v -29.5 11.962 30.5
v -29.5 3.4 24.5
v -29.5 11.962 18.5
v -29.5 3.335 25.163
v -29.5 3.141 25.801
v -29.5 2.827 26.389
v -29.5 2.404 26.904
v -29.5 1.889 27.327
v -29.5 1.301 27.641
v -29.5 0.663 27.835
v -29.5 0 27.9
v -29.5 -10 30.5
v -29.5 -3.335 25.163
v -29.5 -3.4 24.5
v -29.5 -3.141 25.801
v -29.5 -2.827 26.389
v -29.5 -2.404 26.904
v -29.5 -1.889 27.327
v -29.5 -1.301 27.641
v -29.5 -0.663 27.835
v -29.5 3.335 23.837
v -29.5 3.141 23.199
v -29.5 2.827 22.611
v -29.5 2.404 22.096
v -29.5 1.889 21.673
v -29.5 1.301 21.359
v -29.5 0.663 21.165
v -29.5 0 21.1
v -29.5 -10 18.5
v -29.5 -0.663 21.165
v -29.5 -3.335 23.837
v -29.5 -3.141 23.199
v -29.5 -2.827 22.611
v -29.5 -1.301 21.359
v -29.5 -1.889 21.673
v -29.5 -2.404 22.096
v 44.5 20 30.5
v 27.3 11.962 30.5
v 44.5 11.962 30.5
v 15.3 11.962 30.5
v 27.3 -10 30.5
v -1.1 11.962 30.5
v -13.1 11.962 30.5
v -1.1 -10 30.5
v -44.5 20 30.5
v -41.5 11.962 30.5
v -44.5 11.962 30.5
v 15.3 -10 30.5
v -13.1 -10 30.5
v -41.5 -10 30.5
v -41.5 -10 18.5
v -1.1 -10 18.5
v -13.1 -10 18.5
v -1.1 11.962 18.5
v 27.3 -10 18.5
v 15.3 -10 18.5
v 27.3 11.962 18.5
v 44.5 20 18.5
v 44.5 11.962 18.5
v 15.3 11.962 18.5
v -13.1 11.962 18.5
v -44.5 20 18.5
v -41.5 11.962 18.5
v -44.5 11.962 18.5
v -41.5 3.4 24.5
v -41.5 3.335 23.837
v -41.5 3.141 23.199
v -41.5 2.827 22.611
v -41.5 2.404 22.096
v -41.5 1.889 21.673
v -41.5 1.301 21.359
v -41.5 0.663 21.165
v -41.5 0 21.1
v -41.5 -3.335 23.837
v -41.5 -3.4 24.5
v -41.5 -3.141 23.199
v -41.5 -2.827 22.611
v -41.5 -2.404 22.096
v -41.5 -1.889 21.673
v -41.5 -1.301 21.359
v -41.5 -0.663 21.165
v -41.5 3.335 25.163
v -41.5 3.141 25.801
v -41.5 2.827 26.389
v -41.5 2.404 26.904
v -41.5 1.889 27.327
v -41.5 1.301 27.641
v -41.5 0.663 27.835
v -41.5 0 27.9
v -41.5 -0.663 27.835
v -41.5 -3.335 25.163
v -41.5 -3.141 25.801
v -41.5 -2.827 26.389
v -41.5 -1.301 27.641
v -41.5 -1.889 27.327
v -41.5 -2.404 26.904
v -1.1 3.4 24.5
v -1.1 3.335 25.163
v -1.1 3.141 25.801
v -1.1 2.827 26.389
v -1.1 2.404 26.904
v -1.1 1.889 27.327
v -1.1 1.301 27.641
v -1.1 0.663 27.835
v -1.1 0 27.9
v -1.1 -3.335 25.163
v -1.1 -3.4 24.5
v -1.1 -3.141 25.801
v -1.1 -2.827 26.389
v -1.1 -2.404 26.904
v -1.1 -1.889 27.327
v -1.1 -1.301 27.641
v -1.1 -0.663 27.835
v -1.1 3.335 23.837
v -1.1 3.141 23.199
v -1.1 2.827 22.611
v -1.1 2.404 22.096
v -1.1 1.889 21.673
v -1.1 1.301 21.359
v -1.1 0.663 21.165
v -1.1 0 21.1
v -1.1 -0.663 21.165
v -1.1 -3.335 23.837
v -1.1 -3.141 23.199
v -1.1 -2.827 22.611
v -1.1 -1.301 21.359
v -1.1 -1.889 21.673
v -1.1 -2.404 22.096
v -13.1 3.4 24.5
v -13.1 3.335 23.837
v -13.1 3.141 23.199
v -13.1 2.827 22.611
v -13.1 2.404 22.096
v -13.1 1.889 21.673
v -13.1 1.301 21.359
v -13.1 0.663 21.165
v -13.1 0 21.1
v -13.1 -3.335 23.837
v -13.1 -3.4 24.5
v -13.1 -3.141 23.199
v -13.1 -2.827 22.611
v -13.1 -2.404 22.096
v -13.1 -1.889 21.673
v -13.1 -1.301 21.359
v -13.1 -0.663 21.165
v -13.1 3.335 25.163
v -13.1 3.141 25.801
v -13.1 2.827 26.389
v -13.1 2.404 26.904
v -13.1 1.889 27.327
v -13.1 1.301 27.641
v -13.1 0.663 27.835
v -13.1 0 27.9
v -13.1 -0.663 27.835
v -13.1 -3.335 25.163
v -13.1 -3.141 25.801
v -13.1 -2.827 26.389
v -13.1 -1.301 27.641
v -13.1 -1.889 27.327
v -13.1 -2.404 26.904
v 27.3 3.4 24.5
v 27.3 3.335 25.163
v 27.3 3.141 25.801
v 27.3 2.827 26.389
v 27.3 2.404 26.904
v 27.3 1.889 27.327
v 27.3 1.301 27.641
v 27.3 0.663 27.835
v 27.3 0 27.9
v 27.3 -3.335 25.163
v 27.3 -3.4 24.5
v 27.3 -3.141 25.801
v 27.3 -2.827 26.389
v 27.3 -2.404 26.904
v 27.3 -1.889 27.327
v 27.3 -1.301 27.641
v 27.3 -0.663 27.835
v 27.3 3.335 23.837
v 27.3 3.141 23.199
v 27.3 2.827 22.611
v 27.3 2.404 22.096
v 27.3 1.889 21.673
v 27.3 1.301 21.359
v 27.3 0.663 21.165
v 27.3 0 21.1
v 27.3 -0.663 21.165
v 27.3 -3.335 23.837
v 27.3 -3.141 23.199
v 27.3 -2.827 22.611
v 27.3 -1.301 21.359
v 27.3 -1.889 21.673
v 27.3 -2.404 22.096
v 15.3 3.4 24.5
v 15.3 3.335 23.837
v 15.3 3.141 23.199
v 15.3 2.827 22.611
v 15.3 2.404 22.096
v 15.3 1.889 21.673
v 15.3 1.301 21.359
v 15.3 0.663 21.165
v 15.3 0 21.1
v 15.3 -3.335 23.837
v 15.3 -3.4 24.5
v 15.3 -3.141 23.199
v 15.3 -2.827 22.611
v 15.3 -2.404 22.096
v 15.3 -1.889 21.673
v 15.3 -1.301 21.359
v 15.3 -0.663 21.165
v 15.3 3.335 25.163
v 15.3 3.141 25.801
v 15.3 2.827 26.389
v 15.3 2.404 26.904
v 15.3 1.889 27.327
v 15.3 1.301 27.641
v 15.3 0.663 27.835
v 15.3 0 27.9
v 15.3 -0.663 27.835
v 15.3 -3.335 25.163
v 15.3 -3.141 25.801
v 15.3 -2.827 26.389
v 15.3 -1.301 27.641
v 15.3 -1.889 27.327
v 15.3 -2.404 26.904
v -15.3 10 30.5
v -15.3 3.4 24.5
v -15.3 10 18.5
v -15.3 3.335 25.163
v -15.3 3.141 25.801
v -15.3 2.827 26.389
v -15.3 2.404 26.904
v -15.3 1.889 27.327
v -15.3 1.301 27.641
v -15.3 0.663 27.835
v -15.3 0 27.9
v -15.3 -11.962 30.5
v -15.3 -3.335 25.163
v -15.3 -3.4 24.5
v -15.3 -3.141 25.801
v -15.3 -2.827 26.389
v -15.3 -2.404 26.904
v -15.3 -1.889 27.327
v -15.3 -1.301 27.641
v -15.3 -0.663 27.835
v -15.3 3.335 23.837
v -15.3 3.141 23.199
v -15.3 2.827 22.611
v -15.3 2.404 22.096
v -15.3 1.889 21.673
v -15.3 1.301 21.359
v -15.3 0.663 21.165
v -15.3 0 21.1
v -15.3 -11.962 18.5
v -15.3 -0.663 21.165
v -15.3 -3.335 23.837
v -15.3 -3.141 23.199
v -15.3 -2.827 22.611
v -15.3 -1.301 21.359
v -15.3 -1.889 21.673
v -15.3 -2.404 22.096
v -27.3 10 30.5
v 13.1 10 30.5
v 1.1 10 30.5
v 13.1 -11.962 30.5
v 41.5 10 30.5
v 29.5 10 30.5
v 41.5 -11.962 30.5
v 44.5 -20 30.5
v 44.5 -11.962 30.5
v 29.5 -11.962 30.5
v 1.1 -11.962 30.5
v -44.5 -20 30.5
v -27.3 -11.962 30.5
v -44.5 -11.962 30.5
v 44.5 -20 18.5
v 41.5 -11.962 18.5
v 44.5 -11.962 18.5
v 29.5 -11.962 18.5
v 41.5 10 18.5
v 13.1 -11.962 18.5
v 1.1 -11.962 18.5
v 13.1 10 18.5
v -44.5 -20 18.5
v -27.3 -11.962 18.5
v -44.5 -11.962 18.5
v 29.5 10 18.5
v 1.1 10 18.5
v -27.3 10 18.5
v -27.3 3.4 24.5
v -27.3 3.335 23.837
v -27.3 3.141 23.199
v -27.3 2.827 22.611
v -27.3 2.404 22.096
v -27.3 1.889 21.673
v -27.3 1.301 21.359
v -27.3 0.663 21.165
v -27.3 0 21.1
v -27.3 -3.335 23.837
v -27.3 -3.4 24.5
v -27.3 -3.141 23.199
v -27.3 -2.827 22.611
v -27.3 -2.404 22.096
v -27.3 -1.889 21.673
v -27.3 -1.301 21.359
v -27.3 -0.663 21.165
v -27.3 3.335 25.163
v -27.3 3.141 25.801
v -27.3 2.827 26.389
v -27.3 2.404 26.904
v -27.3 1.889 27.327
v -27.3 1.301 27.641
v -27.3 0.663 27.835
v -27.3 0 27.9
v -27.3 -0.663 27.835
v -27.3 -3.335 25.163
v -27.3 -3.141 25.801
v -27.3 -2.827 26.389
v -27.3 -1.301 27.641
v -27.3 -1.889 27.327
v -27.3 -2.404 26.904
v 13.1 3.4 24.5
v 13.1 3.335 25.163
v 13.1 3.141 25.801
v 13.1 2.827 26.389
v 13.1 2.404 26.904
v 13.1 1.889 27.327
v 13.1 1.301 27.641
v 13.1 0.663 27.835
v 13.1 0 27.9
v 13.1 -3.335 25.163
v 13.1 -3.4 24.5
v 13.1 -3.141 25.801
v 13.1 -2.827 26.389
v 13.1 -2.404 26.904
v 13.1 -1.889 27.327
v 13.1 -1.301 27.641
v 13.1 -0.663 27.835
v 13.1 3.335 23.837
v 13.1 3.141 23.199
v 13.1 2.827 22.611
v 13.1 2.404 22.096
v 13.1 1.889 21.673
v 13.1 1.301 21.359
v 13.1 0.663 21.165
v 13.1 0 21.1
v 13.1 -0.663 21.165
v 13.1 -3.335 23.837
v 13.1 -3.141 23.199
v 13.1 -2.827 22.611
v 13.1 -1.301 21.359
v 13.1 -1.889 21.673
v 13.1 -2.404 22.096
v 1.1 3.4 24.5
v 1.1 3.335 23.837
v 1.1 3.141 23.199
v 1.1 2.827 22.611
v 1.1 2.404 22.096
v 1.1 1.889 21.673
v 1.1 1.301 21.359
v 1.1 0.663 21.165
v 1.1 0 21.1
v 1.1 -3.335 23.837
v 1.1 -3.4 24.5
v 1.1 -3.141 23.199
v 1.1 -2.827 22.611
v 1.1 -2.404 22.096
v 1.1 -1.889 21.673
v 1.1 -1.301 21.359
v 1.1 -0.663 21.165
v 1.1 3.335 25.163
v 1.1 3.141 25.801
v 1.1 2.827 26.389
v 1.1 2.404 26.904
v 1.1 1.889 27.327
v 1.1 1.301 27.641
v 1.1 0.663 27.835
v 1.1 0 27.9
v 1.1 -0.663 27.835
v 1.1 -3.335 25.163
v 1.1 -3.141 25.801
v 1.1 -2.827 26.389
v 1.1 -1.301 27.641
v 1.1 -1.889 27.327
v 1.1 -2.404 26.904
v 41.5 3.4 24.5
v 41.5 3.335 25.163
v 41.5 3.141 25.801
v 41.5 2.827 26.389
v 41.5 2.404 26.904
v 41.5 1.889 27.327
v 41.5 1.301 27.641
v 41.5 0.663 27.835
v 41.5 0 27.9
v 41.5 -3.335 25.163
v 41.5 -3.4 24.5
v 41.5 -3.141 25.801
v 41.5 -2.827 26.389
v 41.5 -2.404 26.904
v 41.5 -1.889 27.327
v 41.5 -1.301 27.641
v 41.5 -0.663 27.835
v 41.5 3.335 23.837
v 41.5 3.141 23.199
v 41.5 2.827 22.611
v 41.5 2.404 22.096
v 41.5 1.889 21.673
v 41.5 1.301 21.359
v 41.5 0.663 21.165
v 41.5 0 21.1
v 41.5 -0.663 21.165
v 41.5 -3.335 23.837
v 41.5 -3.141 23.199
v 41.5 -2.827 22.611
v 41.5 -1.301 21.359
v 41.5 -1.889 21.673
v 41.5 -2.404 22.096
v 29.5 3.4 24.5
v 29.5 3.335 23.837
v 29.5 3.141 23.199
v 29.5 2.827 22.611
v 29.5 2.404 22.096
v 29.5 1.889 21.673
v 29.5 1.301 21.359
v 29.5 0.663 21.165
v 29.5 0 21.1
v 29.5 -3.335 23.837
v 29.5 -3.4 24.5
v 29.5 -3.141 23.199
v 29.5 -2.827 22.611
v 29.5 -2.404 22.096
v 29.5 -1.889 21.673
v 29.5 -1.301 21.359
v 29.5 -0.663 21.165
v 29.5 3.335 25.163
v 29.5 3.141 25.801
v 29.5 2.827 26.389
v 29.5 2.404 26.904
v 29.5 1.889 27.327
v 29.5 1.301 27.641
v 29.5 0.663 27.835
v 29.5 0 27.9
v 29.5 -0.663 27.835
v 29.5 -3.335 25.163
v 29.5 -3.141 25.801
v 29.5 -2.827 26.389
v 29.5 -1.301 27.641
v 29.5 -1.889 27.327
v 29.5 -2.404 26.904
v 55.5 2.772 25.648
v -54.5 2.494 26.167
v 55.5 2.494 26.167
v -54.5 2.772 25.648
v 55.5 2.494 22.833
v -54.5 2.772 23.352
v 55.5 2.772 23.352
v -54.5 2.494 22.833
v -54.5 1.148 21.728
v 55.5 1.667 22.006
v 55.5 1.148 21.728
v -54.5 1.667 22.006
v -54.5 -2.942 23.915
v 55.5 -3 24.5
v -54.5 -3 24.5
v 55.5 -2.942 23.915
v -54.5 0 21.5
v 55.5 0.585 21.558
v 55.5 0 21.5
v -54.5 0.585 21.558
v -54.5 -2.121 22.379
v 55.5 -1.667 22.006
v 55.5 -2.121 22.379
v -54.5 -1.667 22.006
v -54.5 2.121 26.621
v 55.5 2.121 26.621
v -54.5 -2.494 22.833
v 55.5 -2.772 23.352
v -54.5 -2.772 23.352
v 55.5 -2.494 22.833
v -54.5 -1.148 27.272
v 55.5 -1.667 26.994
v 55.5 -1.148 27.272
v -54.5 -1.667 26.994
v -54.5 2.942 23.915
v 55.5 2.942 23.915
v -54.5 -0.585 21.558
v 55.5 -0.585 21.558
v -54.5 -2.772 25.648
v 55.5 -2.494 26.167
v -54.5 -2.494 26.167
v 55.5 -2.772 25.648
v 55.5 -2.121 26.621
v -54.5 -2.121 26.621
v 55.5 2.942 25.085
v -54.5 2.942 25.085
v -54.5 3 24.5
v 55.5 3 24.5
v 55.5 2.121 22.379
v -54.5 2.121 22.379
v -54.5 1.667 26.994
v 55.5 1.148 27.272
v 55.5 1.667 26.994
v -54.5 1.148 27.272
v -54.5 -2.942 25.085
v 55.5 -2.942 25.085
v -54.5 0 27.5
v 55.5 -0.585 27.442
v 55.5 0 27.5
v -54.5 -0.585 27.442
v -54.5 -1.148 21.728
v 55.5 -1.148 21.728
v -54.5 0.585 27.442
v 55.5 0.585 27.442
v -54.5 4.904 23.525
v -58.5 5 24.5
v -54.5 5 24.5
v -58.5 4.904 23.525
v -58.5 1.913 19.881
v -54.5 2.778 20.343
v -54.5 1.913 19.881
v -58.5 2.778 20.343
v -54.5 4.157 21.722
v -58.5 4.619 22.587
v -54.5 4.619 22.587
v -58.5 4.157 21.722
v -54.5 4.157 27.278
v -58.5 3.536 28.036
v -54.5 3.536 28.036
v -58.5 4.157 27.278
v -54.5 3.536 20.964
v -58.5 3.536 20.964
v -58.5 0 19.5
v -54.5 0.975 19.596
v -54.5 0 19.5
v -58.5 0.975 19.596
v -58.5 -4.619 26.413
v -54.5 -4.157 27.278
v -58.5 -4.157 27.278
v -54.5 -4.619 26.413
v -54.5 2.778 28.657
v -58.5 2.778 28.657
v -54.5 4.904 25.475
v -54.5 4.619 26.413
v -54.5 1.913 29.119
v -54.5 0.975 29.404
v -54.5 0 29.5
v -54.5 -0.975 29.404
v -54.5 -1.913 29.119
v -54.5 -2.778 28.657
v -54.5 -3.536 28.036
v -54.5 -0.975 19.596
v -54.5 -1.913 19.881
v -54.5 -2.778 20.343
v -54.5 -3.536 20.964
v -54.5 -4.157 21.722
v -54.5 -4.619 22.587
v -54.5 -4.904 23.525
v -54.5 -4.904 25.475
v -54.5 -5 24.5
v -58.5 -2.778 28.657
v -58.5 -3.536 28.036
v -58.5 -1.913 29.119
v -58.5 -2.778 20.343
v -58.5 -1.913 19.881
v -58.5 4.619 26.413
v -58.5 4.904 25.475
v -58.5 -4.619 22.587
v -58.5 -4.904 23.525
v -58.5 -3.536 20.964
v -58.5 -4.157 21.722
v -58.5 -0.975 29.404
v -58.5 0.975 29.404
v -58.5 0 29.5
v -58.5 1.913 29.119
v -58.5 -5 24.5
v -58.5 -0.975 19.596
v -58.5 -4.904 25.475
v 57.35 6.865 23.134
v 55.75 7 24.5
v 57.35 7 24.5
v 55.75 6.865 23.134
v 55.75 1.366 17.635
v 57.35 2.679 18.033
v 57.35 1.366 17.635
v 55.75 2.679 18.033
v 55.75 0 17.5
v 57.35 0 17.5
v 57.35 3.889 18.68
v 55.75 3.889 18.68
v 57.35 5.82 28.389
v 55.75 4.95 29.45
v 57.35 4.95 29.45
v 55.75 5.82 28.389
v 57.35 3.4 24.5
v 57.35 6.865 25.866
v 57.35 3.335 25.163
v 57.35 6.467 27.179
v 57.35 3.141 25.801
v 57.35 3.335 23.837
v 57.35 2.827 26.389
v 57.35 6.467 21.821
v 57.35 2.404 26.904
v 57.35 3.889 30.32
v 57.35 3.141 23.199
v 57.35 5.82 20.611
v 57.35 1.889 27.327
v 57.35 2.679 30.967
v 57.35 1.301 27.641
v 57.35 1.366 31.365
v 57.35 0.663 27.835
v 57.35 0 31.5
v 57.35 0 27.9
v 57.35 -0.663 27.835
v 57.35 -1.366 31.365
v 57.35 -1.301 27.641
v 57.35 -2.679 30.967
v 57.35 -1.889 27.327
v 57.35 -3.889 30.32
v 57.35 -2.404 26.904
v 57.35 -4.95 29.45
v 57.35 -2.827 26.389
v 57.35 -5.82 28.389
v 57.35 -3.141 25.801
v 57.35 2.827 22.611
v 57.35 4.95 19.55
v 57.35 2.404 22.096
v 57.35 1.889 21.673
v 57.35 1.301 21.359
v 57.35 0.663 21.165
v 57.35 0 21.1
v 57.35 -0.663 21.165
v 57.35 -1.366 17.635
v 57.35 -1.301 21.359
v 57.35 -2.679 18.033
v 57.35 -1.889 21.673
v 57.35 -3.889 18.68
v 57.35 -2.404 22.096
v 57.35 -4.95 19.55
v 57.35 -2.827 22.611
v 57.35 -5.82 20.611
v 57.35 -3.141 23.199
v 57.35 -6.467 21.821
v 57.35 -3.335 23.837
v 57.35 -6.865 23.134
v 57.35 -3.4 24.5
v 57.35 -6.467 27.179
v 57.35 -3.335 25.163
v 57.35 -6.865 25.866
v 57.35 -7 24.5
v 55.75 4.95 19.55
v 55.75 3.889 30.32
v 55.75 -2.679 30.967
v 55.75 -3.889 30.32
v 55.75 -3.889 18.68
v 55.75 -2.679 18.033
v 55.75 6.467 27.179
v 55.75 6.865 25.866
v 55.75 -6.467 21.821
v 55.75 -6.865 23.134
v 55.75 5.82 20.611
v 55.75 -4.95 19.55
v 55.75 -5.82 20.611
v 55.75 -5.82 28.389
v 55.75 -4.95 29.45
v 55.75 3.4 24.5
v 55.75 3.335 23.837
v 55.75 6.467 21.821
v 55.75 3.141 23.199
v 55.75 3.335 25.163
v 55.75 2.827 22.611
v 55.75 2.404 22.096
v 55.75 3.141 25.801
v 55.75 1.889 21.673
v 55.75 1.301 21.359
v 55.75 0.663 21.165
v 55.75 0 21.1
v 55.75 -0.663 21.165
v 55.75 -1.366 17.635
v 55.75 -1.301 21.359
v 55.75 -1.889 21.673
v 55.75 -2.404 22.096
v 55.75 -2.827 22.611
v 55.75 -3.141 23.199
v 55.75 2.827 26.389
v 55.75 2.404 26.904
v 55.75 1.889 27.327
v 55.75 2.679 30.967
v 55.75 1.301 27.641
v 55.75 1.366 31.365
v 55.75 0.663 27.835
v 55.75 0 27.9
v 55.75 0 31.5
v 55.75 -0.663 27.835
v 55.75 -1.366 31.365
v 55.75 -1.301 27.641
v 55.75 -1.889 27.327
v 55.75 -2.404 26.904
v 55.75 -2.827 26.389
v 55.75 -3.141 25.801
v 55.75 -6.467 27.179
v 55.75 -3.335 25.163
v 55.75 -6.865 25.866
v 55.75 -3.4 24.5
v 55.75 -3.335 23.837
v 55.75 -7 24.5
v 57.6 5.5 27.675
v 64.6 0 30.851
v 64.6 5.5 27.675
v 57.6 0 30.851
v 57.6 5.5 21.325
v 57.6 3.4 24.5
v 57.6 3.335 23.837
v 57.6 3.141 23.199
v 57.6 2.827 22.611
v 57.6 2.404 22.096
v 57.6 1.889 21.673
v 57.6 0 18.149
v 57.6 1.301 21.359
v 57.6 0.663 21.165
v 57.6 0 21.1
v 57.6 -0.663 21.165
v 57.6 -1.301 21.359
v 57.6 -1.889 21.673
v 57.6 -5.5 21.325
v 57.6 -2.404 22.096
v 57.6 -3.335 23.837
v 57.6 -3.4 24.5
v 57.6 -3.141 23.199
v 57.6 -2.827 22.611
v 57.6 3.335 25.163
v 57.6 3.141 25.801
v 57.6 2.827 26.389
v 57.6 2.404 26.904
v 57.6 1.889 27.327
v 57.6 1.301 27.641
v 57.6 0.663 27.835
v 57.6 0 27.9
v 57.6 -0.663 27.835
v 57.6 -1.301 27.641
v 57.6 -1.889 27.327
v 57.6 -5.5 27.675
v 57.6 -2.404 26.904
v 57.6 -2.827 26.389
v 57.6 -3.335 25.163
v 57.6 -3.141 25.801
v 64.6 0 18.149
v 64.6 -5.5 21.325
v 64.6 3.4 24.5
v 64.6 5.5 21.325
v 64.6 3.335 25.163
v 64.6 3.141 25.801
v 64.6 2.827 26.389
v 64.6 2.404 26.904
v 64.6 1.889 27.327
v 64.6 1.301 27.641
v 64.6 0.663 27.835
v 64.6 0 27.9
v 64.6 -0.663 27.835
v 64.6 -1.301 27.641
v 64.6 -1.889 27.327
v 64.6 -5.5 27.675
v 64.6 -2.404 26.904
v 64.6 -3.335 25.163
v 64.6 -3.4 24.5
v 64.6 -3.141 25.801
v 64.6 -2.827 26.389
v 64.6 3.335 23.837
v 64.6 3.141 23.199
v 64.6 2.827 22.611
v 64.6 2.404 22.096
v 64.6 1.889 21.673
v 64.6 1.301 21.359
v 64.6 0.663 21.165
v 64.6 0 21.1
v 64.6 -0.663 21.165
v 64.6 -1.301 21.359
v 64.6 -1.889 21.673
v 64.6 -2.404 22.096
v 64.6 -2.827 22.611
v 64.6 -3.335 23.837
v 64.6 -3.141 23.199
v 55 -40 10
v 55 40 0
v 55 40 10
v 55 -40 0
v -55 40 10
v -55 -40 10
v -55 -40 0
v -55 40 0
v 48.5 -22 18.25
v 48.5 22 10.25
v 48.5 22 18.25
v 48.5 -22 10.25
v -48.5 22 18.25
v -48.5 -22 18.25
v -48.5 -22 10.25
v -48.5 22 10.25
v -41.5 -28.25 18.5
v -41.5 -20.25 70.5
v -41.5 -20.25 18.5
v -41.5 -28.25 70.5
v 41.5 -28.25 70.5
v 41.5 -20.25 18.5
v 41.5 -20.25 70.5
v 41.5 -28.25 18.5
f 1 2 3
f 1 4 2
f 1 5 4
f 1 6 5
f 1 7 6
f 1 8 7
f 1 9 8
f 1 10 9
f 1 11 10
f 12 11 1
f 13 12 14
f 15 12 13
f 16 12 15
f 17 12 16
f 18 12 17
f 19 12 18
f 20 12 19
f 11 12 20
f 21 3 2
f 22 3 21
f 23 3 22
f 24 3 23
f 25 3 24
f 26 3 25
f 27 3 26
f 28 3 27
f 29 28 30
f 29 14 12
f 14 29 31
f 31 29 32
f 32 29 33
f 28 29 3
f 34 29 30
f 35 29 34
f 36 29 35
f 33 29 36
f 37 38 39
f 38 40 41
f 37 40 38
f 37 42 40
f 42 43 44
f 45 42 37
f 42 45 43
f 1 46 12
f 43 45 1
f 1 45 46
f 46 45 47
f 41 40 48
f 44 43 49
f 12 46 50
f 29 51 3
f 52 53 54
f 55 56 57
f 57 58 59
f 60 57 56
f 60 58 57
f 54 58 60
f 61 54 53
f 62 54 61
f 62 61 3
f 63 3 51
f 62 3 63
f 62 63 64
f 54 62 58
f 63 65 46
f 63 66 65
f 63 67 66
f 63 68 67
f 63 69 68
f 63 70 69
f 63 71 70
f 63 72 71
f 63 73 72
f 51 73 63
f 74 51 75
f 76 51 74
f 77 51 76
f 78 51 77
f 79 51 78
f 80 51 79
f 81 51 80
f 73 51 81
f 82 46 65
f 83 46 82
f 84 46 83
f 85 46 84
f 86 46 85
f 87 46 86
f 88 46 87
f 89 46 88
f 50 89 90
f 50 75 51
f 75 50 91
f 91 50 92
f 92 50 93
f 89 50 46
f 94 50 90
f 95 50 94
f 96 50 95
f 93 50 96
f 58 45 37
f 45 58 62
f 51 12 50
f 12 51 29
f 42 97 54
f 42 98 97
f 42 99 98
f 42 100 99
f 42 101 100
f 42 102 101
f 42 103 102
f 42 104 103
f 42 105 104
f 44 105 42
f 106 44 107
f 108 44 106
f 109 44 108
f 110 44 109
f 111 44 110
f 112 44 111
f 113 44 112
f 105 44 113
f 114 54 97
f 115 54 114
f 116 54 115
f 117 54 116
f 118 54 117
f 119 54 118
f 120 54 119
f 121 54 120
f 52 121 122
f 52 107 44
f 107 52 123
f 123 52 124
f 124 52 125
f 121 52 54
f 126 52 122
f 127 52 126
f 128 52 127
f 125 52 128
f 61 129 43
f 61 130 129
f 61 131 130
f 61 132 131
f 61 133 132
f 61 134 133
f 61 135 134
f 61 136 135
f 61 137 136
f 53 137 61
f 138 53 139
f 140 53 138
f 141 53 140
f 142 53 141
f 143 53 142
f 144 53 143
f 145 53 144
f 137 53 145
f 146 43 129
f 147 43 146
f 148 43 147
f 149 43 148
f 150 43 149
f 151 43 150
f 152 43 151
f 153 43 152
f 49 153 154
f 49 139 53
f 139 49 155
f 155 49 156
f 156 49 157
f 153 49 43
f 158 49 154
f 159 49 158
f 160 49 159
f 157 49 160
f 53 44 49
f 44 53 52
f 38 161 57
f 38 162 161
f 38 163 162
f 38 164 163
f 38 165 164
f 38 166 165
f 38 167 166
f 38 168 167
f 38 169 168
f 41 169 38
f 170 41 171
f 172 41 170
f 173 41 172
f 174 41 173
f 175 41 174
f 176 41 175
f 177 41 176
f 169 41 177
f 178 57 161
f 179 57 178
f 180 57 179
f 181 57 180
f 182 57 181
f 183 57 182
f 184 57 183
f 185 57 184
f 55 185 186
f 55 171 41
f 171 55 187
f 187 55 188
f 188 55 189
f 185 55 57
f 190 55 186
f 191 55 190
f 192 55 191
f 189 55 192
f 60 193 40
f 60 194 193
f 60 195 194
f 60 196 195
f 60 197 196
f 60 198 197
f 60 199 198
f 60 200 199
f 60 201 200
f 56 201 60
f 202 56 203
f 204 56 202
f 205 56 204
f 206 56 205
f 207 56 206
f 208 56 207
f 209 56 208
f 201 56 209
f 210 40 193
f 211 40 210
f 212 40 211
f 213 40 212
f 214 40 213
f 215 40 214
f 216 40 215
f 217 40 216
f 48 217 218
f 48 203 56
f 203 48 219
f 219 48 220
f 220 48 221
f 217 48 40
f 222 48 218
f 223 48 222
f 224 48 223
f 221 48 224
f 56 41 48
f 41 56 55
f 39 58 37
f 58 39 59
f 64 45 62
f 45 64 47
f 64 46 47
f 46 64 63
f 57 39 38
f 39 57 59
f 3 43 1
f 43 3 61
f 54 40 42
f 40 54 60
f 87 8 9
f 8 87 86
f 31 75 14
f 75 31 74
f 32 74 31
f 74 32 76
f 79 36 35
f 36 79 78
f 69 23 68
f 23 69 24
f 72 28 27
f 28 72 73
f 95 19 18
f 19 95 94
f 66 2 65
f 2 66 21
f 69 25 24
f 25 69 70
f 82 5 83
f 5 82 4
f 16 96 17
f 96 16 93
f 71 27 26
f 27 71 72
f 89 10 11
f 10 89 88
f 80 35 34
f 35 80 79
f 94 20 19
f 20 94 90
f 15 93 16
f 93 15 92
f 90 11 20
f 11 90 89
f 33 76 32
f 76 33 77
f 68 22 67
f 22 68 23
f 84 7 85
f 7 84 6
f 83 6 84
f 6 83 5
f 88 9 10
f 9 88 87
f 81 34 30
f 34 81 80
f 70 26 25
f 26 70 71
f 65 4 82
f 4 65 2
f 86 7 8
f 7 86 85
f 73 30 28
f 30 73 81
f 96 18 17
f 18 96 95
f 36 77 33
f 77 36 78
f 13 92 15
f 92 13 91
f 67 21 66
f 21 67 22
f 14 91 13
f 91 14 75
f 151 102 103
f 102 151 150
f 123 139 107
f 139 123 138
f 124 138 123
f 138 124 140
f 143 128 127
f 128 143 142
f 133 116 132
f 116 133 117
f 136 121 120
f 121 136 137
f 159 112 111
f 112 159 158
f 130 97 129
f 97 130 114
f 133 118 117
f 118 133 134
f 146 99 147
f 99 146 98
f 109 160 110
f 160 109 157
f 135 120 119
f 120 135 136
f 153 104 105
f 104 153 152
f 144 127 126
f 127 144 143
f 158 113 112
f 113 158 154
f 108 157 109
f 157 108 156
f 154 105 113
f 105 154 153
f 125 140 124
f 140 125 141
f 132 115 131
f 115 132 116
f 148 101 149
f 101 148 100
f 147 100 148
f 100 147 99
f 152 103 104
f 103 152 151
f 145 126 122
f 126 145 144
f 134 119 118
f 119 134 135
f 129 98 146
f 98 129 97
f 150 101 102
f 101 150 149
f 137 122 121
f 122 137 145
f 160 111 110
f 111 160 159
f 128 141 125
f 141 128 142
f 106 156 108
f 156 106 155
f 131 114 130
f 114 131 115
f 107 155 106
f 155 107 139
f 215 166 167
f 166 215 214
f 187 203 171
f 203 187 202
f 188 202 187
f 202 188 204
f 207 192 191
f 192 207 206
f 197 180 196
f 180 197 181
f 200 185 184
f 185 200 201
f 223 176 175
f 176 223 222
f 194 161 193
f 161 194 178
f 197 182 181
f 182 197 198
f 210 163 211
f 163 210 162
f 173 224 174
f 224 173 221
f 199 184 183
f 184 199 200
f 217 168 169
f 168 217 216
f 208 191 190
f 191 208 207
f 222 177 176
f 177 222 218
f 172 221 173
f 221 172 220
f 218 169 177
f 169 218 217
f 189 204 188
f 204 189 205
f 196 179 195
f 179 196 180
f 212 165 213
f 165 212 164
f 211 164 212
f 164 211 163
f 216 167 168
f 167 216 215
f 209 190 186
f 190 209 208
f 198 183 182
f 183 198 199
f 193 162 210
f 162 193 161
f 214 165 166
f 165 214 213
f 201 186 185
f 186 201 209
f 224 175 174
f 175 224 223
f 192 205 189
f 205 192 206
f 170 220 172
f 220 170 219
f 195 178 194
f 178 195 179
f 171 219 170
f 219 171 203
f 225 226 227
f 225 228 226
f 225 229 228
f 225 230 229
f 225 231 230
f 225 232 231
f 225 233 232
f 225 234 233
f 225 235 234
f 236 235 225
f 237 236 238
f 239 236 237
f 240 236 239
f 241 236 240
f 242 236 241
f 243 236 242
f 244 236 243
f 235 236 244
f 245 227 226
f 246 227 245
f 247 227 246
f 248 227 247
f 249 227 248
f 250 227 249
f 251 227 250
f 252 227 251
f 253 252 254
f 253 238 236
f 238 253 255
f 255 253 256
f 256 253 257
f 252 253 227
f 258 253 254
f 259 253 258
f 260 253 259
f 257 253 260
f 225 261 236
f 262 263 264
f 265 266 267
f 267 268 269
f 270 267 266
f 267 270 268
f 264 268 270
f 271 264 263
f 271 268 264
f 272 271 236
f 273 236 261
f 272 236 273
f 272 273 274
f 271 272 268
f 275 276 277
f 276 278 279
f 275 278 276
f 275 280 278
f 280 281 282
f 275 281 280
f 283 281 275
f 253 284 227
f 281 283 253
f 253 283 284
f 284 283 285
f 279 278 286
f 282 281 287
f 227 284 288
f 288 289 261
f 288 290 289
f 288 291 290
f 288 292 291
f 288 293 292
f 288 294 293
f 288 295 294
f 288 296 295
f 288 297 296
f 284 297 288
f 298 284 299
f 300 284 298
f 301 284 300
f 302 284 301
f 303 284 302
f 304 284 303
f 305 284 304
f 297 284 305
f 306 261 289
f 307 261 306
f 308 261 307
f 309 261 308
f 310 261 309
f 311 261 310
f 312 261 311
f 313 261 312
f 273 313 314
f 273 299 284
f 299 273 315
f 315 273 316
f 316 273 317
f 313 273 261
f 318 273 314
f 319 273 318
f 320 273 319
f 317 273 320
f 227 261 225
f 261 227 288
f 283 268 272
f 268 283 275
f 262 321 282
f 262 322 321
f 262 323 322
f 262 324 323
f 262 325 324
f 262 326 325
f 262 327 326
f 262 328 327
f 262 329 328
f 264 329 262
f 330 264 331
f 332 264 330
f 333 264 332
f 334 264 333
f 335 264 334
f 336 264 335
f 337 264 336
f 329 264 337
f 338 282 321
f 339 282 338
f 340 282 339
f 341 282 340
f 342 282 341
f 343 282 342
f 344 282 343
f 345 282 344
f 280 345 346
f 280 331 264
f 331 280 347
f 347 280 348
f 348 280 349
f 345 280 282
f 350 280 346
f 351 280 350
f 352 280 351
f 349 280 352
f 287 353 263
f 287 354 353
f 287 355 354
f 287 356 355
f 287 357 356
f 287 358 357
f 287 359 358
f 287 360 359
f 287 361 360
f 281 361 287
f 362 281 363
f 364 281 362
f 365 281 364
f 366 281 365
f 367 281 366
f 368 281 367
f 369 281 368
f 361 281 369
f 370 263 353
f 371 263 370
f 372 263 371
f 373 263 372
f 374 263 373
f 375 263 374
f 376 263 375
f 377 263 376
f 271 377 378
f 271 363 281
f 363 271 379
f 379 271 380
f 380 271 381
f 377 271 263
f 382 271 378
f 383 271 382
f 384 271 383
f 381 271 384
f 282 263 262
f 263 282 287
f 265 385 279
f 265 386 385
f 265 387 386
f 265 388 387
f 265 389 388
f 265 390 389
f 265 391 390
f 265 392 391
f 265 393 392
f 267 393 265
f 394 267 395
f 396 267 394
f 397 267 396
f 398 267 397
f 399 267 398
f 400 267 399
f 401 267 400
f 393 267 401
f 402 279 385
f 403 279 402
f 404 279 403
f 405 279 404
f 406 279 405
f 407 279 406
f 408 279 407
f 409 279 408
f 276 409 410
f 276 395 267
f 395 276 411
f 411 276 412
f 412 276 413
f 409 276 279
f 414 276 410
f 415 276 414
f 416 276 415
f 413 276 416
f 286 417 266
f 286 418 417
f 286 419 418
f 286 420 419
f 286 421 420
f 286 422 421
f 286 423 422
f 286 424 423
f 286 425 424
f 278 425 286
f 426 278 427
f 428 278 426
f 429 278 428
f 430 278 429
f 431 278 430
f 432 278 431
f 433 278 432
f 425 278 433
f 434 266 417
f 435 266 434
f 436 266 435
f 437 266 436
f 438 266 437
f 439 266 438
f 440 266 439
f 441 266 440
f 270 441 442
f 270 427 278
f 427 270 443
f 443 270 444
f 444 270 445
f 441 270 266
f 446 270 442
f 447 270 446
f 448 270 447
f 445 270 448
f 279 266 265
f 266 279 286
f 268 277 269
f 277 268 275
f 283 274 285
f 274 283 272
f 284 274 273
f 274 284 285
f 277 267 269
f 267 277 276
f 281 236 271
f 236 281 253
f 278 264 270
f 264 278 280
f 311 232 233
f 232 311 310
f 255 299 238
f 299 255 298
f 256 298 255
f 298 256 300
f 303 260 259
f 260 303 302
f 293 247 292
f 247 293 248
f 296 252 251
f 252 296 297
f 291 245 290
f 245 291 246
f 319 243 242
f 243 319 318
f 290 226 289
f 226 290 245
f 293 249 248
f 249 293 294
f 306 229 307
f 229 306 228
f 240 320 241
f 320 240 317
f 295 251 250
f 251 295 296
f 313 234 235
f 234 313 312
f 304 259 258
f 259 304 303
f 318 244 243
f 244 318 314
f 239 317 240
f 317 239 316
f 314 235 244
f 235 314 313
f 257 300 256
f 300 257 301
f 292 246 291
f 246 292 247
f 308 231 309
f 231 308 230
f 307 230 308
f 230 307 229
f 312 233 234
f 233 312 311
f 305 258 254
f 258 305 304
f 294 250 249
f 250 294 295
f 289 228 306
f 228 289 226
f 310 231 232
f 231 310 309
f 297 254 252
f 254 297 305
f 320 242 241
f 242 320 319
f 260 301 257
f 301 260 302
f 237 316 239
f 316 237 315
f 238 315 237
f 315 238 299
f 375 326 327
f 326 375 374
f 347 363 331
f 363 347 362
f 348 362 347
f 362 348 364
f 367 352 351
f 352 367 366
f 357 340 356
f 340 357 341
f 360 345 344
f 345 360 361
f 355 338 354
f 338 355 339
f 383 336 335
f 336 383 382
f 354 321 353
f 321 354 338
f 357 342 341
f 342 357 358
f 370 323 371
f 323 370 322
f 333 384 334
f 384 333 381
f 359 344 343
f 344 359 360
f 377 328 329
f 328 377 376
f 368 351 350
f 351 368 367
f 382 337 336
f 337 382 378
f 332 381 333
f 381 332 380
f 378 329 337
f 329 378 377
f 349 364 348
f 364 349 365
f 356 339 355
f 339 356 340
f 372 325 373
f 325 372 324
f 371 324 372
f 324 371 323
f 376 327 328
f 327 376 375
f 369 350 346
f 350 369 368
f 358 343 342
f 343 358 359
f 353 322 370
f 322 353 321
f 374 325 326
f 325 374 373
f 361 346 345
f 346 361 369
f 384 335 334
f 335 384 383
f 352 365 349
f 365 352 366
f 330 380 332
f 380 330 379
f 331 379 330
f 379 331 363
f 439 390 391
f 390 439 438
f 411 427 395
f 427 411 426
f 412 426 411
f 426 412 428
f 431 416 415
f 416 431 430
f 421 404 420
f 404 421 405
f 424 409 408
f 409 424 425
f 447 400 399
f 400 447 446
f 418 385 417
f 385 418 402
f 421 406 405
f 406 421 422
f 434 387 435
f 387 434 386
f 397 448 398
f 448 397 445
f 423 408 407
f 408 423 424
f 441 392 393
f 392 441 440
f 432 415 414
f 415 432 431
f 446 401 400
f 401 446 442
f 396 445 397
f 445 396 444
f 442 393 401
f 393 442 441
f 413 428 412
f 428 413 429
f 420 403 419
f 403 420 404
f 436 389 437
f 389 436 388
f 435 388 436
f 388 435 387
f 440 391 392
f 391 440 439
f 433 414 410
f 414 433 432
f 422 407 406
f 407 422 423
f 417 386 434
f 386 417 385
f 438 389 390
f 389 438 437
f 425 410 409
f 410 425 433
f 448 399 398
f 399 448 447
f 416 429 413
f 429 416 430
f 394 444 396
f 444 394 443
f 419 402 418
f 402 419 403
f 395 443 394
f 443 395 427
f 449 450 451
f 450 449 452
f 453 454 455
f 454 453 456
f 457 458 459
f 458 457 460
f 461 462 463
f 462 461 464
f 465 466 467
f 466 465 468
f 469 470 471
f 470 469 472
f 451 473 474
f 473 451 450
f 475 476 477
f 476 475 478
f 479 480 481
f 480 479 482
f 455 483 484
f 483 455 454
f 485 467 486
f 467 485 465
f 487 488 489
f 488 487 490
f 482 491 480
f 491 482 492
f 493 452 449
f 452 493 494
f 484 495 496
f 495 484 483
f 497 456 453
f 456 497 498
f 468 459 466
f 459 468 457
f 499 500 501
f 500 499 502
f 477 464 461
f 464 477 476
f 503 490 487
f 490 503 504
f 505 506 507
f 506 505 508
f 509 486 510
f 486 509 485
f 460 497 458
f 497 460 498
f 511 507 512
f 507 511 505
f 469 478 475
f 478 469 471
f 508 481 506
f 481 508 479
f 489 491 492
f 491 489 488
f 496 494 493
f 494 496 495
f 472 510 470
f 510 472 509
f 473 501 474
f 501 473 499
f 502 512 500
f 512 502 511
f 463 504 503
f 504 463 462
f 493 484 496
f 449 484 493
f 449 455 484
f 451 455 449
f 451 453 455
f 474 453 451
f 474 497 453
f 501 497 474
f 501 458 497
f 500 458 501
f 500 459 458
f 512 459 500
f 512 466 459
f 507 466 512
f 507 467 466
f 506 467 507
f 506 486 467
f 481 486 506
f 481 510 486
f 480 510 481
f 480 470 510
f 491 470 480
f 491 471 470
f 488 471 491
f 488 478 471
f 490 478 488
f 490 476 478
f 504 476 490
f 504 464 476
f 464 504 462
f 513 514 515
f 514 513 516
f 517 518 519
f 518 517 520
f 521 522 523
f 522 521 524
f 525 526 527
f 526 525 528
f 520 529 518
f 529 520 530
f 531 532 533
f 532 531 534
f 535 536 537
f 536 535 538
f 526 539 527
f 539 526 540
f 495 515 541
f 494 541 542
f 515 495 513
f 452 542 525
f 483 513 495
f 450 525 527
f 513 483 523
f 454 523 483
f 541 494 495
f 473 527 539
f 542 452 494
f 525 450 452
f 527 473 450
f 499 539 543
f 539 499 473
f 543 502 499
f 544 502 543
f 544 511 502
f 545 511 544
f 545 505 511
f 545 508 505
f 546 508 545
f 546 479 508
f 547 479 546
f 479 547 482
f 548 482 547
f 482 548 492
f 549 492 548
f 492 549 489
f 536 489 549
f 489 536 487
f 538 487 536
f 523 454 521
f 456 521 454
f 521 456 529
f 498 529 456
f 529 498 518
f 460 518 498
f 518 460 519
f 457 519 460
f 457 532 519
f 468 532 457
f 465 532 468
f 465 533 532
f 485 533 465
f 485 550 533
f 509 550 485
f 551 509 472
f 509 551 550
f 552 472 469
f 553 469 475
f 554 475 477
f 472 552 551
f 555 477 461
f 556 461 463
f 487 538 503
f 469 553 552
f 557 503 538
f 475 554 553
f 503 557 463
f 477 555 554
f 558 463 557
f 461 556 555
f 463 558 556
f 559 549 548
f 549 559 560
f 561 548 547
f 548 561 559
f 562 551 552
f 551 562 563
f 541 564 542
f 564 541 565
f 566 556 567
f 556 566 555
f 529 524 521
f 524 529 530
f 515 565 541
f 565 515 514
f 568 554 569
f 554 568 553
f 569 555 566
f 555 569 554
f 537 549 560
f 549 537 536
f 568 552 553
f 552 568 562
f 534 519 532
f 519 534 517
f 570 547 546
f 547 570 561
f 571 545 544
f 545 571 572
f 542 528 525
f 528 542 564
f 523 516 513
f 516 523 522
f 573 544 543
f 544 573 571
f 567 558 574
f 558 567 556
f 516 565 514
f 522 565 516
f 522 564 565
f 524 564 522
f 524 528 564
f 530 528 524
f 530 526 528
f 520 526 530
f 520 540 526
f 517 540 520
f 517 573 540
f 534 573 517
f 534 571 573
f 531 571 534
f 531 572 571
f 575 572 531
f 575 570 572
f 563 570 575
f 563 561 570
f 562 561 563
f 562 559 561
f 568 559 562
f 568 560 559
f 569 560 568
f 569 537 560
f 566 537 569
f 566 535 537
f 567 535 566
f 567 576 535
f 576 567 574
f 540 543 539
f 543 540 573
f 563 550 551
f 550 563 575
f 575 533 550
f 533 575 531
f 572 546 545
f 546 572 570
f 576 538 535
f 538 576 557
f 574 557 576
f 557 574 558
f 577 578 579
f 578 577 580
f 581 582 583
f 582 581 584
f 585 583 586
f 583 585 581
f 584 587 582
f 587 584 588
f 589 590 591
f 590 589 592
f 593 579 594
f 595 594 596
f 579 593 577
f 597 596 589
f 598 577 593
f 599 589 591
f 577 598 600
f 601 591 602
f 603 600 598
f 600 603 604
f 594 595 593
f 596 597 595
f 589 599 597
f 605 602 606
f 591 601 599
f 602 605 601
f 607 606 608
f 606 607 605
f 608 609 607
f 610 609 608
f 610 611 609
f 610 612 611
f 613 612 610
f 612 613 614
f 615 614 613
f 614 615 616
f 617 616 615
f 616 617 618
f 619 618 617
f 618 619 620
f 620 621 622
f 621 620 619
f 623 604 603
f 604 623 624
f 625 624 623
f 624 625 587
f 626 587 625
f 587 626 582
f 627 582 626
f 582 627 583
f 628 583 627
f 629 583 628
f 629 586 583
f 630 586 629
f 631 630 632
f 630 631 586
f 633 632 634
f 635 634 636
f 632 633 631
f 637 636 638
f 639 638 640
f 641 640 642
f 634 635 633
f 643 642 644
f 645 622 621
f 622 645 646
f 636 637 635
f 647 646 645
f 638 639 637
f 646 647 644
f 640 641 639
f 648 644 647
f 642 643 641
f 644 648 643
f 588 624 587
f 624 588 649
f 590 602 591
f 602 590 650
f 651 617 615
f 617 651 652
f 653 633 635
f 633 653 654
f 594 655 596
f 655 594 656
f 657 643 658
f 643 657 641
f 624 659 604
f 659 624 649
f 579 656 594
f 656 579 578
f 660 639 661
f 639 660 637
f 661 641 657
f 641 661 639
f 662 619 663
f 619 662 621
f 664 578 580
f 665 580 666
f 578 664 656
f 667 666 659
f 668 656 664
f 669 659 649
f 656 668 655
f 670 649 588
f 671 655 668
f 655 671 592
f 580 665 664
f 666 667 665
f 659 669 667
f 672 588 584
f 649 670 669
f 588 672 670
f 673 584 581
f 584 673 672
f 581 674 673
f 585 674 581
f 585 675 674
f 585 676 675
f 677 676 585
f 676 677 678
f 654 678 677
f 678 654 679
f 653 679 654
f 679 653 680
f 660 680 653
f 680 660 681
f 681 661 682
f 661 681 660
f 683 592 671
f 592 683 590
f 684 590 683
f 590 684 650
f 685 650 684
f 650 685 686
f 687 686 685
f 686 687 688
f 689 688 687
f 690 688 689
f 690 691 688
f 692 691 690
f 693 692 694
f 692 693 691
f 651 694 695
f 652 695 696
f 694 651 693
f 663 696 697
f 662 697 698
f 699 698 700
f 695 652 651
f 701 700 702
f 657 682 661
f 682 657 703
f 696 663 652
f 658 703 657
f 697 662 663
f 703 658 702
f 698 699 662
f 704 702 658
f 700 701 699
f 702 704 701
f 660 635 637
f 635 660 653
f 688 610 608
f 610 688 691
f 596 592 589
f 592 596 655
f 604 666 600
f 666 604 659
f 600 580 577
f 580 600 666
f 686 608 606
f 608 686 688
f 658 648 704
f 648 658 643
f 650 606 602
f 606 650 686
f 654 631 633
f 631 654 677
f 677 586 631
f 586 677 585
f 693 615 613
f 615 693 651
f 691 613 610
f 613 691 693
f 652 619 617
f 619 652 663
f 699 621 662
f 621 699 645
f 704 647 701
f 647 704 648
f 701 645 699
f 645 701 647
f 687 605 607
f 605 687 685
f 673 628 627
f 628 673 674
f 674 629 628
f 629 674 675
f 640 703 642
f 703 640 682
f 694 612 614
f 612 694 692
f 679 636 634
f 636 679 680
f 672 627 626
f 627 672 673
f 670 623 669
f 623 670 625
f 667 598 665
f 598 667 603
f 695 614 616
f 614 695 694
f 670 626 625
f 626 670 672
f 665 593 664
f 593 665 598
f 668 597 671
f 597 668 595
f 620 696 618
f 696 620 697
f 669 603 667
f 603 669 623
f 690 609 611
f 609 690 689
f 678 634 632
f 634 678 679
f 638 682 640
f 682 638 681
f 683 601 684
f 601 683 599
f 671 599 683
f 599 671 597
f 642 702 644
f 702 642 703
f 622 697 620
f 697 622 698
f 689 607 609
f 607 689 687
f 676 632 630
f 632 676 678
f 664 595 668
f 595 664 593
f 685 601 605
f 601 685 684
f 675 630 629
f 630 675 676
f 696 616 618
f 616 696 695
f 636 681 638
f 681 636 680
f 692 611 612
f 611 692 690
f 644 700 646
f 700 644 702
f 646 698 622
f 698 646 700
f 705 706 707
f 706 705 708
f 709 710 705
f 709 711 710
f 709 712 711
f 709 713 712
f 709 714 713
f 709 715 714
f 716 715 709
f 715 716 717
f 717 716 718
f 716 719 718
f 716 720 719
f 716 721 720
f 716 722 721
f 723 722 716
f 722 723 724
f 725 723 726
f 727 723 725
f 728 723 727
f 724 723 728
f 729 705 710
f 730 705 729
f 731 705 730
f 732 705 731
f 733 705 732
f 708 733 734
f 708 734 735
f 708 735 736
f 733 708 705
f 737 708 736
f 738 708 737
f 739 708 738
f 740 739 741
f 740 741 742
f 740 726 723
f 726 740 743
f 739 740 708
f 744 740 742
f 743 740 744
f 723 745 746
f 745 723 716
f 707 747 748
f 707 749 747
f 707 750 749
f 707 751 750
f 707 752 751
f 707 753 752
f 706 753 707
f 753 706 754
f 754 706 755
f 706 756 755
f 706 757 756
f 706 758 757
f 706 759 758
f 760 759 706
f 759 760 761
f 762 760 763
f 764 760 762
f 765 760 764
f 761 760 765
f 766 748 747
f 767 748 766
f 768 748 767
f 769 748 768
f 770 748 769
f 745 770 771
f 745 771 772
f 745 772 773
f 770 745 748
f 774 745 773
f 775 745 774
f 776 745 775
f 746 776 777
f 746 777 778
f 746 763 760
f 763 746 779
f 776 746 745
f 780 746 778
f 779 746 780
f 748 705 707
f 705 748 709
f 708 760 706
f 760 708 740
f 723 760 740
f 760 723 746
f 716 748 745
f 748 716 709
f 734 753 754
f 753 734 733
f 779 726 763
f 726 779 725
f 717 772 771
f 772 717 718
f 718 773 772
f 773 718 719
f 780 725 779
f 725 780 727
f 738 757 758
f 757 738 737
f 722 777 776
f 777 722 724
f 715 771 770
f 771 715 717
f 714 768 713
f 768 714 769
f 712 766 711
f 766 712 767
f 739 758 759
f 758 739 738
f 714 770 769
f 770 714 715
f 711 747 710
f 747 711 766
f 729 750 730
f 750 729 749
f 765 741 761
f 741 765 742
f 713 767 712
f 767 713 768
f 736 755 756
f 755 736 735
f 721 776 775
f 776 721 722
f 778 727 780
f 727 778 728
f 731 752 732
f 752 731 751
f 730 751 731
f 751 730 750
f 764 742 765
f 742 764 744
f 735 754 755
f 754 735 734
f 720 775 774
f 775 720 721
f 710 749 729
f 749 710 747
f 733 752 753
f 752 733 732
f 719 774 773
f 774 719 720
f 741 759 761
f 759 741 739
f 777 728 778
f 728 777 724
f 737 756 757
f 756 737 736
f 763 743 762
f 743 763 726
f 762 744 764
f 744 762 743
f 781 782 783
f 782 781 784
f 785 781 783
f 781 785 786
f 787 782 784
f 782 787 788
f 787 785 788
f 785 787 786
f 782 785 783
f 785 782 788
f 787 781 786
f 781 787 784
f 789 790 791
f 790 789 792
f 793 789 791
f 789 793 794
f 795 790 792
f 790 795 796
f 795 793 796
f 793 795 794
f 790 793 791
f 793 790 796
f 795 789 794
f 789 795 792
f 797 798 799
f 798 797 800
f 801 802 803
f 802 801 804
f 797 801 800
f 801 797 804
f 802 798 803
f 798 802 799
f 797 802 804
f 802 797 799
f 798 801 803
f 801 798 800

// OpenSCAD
$fn = 32;

// ------------------------------------------------------------------------
// Comb hinge with flap: leaf 89 x 20 mm, pin d6, flap 52 mm
// Every part is its own module, assembly() places every instance.
// ------------------------------------------------------------------------

// --- part 1 ---
module hinge_bed() {
  difference() {
    translate([-55, -40, 0]) cube([110, 80, 10]);
  }
}

// --- part 2 ---
module hinge_riser() {
  difference() {
    translate([-48.5, -22, 0]) cube([97, 44, 8]);
  }
}

// --- part 3 ---
module hinge_leaf_a() {
  difference() {
    union() {
      translate([-41.5, -10, -6]) cube([12, 30, 12]);
      translate([-13.1, -10, -6]) cube([12, 30, 12]);
      translate([15.3, -10, -6]) cube([12, 30, 12]);
      translate([-44.5, 11.962, -6]) cube([89, 8.038, 12]);
    }
    translate([-35.5, 0, 0]) rotate([0, 90, 0]) cylinder(h = 14, d = 6.8, center = true);
    translate([-7.1, 0, 0]) rotate([0, 90, 0]) cylinder(h = 14, d = 6.8, center = true);
    translate([21.3, 0, 0]) rotate([0, 90, 0]) cylinder(h = 14, d = 6.8, center = true);
  }
}

// --- part 4 ---
module hinge_leaf_b() {
  difference() {
    union() {
      translate([-27.3, -20, -6]) cube([12, 30, 12]);
      translate([1.1, -20, -6]) cube([12, 30, 12]);
      translate([29.5, -20, -6]) cube([12, 30, 12]);
      translate([-44.5, -20, -6]) cube([89, 8.038, 12]);
    }
    translate([-21.3, 0, 0]) rotate([0, 90, 0]) cylinder(h = 14, d = 6.8, center = true);
    translate([7.1, 0, 0]) rotate([0, 90, 0]) cylinder(h = 14, d = 6.8, center = true);
    translate([35.5, 0, 0]) rotate([0, 90, 0]) cylinder(h = 14, d = 6.8, center = true);
  }
}

// --- part 5 ---
module hinge_flap() {
  difference() {
    translate([-41.5, -26, 0]) cube([83, 52, 8]);
  }
}

// --- part 6 ---
module hinge_pin() {
  rotate([0, 90, 0]) cylinder(h = 111, d = 6, center = true);
  translate([-58.5, 0, 0]) rotate([0, 90, 0]) cylinder(h = 4, d = 10);
}

// --- part 7 ---
module pin_washer() {
  difference() {
      translate([0, 0, 0]) cylinder(h = 1.6, d = 14);
      translate([0, 0, -1]) cylinder(h = 3.6, d = 6.8);
    }
}

// --- part 8 ---
module pin_nut() {
  difference() {
    linear_extrude(height = 7) polygon(points = [[6.351, 0], [3.175, 5.5], [-3.175, 5.5], [-6.351, 0], [-3.175, -5.5], [3.175, -5.5]]);
    translate([0, 0, -1]) cylinder(h = 9, d = 6.8);
  }
}

// --- assembly ---
module assembly() {
  color([0.80, 0.24, 0.20]) translate([0, 0, 0]) rotate([0, 0, 0]) hinge_bed();
  color([0.20, 0.45, 0.75]) translate([0, 0, 10.25]) rotate([0, 0, 0]) hinge_riser();
  color([0.25, 0.62, 0.32]) translate([0, 0, 24.5]) rotate([0, 0, 0]) hinge_leaf_a();
  color([0.92, 0.70, 0.18]) translate([0, 0, 24.5]) rotate([0, 0, 0]) hinge_leaf_b();
  color([0.58, 0.35, 0.70]) translate([0, -20.25, 44.5]) rotate([90, 0, 0]) hinge_flap();
  color([0.16, 0.66, 0.66]) translate([0, 0, 24.5]) rotate([0, 0, 0]) hinge_pin();
  color([0.85, 0.48, 0.18]) translate([55.75, 0, 24.5]) rotate([0, 90, 0]) pin_washer();
  color([0.55, 0.60, 0.65]) translate([57.6, 0, 24.5]) rotate([0, 90, 0]) pin_nut();
}

assembly();
